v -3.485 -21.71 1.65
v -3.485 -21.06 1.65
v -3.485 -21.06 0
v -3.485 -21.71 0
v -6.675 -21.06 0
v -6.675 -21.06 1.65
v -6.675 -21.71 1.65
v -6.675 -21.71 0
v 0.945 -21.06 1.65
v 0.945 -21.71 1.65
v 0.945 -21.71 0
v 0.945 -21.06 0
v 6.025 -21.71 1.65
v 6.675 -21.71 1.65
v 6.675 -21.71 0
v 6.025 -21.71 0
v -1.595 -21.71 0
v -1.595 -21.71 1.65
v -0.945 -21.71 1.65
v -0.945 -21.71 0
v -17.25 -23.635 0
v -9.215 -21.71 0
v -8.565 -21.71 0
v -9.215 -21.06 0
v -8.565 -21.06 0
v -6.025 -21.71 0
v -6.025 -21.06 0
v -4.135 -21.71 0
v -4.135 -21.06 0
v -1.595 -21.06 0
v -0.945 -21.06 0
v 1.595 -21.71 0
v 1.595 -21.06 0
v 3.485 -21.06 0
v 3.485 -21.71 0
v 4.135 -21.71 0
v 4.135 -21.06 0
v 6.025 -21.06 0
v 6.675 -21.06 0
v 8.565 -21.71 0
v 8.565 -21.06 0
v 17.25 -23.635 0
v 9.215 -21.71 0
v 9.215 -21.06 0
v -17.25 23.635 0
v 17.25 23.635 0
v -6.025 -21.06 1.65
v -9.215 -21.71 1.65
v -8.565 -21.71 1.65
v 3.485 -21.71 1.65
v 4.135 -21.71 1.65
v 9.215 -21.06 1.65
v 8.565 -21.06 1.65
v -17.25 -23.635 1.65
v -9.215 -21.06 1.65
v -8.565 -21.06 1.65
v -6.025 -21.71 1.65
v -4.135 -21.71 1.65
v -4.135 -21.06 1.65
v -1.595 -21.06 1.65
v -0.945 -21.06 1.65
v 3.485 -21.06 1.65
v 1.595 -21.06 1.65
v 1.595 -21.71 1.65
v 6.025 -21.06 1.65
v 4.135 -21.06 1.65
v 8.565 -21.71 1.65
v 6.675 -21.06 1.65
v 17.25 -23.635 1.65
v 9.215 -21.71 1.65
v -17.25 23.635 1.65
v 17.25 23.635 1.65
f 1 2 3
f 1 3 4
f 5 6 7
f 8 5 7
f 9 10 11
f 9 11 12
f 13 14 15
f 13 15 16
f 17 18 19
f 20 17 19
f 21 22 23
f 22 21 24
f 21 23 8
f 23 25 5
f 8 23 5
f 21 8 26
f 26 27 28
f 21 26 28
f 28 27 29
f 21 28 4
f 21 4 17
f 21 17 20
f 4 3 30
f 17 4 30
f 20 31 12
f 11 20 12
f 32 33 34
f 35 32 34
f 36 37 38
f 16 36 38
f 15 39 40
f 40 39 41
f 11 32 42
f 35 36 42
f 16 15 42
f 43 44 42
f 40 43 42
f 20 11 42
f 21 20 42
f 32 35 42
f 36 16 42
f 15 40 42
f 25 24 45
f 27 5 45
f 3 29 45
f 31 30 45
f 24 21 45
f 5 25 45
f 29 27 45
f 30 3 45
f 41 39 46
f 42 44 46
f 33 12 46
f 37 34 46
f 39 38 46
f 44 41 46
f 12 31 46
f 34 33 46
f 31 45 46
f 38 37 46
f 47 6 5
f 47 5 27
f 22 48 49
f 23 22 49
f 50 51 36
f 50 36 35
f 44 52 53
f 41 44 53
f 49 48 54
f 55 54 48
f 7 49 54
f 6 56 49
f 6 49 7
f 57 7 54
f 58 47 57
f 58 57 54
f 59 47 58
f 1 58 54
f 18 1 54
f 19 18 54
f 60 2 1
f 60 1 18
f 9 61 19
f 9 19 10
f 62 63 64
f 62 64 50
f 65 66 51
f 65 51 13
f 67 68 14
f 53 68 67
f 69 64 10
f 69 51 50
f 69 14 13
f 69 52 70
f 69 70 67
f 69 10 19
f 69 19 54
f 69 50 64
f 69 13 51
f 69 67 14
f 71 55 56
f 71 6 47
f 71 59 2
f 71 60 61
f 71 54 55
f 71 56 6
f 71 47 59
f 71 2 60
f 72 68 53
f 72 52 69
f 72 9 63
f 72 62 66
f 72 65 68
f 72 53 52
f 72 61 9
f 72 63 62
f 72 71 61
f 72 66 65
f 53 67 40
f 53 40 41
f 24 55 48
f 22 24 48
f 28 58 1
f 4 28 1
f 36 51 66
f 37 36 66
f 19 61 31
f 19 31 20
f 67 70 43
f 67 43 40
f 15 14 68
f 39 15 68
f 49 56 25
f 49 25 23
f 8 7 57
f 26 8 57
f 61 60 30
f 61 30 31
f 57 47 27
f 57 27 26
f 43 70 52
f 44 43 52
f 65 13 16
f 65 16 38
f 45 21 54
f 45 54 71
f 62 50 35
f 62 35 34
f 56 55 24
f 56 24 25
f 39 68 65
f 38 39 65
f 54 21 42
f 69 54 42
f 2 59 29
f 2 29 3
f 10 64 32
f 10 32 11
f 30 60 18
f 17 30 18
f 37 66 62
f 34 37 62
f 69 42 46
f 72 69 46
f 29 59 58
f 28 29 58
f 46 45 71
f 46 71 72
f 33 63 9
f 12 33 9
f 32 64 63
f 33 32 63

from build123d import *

# Parameters (mm, degrees)
SKETCH1_W               = 34.5
SKETCH1_H               = 47.27
BOSS_EXTRUDE1_DEPTH     = 1.65
BOSS_EXTRUDE2_START     = -3.05
SKETCH2_W               = 0.65
SKETCH2_H               = 0.65
BOSS_EXTRUDE2_DEPTH     = 11.55
CUT_EXTRUDE1_START      = -4.05
SKETCH2_2_W             = 0.65
SKETCH2_2_H             = 0.65
CUT_EXTRUDE1_DEPTH      = 13.55
LPATTERN1_COUNT         = 4
LPATTERN1_PITCH         = 2.54
MIRROR1_START           = -4.05
MIRROR1_COPY_1_SKETCH_W = 0.65
MIRROR1_COPY_1_SKETCH_H = 0.65
MIRROR1_COPY_1_DEPTH    = 13.55
MIRROR1_COPY_2_SKETCH_W = 0.65
MIRROR1_COPY_2_SKETCH_H = 0.65
MIRROR1_COPY_2_DEPTH    = 13.55
MIRROR1_COPY_3_SKETCH_W = 0.65
MIRROR1_COPY_3_SKETCH_H = 0.65
MIRROR1_COPY_3_DEPTH    = 13.55
MIRROR1_COPY_4_SKETCH_W = 0.65
MIRROR1_COPY_4_SKETCH_H = 0.65
MIRROR1_COPY_4_DEPTH    = 13.55


with BuildPart() as part:
    # Sketch1 → Boss-Extrude1 (new body)
    with BuildSketch(Plane.XY):
        Rectangle(SKETCH1_W, SKETCH1_H)
    extrude(amount=BOSS_EXTRUDE1_DEPTH)

    # Sketch2 → Boss-Extrude2 (add)
    with BuildSketch(Plane(origin=(0, 0, 0), x_dir=(-1, 0, 0), z_dir=(0, 0, -1)).offset(BOSS_EXTRUDE2_START)):
        with Locations((-1.27, -21.385)):
            Rectangle(SKETCH2_W, SKETCH2_H)
    boss_extrude2 = extrude(amount=BOSS_EXTRUDE2_DEPTH)

    # Sketch2<2> → Cut-Extrude1 (cut)
    with BuildSketch(Plane(origin=(0, 0, 0), x_dir=(-1, 0, 0), z_dir=(0, 0, -1)).offset(CUT_EXTRUDE1_START)):
        with Locations((-1.27, -21.385)):
            Rectangle(SKETCH2_2_W, SKETCH2_2_H)
    cut_extrude1 = extrude(amount=CUT_EXTRUDE1_DEPTH, mode=Mode.SUBTRACT)

    # LPattern1: Cut-Extrude1 ×4
    with Locations(*[(i * LPATTERN1_PITCH, 0, 0) for i in range(1, LPATTERN1_COUNT)]):
        add(cut_extrude1, mode=Mode.SUBTRACT)

    # Mirror1: Boss-Extrude2 across plane
    add(boss_extrude2.mirror(Plane(origin=(0, 0, 0), x_dir=(0, 0, 1), z_dir=(1, 0, 0))))

    # Mirror1 copy 1 sketch → Mirror1 copy 1 (cut)
    with BuildSketch(Plane(origin=(-2.54, 0, 0), x_dir=(1, 0, 0), z_dir=(0, 0, -1)).offset(MIRROR1_START)):
        with Locations((-1.27, 21.385)):
            Rectangle(MIRROR1_COPY_1_SKETCH_W, MIRROR1_COPY_1_SKETCH_H)
    extrude(amount=MIRROR1_COPY_1_DEPTH, mode=Mode.SUBTRACT)

    # Mirror1 copy 2 sketch → Mirror1 copy 2 (cut)
    with BuildSketch(Plane(origin=(-5.08, 0, 0), x_dir=(1, 0, 0), z_dir=(0, 0, -1)).offset(MIRROR1_START)):
        with Locations((-1.27, 21.385)):
            Rectangle(MIRROR1_COPY_2_SKETCH_W, MIRROR1_COPY_2_SKETCH_H)
    extrude(amount=MIRROR1_COPY_2_DEPTH, mode=Mode.SUBTRACT)

    # Mirror1 copy 3 sketch → Mirror1 copy 3 (cut)
    with BuildSketch(Plane(origin=(-7.62, 0, 0), x_dir=(1, 0, 0), z_dir=(0, 0, -1)).offset(MIRROR1_START)):
        with Locations((-1.27, 21.385)):
            Rectangle(MIRROR1_COPY_3_SKETCH_W, MIRROR1_COPY_3_SKETCH_H)
    extrude(amount=MIRROR1_COPY_3_DEPTH, mode=Mode.SUBTRACT)

    # Mirror1 copy 4 sketch → Mirror1 copy 4 (cut)
    with BuildSketch(Plane(origin=(0, 0, 0), x_dir=(1, 0, 0), z_dir=(0, 0, -1)).offset(MIRROR1_START)):
        with Locations((-1.27, 21.385)):
            Rectangle(MIRROR1_COPY_4_SKETCH_W, MIRROR1_COPY_4_SKETCH_H)
    extrude(amount=MIRROR1_COPY_4_DEPTH, mode=Mode.SUBTRACT)


solid = part.part
